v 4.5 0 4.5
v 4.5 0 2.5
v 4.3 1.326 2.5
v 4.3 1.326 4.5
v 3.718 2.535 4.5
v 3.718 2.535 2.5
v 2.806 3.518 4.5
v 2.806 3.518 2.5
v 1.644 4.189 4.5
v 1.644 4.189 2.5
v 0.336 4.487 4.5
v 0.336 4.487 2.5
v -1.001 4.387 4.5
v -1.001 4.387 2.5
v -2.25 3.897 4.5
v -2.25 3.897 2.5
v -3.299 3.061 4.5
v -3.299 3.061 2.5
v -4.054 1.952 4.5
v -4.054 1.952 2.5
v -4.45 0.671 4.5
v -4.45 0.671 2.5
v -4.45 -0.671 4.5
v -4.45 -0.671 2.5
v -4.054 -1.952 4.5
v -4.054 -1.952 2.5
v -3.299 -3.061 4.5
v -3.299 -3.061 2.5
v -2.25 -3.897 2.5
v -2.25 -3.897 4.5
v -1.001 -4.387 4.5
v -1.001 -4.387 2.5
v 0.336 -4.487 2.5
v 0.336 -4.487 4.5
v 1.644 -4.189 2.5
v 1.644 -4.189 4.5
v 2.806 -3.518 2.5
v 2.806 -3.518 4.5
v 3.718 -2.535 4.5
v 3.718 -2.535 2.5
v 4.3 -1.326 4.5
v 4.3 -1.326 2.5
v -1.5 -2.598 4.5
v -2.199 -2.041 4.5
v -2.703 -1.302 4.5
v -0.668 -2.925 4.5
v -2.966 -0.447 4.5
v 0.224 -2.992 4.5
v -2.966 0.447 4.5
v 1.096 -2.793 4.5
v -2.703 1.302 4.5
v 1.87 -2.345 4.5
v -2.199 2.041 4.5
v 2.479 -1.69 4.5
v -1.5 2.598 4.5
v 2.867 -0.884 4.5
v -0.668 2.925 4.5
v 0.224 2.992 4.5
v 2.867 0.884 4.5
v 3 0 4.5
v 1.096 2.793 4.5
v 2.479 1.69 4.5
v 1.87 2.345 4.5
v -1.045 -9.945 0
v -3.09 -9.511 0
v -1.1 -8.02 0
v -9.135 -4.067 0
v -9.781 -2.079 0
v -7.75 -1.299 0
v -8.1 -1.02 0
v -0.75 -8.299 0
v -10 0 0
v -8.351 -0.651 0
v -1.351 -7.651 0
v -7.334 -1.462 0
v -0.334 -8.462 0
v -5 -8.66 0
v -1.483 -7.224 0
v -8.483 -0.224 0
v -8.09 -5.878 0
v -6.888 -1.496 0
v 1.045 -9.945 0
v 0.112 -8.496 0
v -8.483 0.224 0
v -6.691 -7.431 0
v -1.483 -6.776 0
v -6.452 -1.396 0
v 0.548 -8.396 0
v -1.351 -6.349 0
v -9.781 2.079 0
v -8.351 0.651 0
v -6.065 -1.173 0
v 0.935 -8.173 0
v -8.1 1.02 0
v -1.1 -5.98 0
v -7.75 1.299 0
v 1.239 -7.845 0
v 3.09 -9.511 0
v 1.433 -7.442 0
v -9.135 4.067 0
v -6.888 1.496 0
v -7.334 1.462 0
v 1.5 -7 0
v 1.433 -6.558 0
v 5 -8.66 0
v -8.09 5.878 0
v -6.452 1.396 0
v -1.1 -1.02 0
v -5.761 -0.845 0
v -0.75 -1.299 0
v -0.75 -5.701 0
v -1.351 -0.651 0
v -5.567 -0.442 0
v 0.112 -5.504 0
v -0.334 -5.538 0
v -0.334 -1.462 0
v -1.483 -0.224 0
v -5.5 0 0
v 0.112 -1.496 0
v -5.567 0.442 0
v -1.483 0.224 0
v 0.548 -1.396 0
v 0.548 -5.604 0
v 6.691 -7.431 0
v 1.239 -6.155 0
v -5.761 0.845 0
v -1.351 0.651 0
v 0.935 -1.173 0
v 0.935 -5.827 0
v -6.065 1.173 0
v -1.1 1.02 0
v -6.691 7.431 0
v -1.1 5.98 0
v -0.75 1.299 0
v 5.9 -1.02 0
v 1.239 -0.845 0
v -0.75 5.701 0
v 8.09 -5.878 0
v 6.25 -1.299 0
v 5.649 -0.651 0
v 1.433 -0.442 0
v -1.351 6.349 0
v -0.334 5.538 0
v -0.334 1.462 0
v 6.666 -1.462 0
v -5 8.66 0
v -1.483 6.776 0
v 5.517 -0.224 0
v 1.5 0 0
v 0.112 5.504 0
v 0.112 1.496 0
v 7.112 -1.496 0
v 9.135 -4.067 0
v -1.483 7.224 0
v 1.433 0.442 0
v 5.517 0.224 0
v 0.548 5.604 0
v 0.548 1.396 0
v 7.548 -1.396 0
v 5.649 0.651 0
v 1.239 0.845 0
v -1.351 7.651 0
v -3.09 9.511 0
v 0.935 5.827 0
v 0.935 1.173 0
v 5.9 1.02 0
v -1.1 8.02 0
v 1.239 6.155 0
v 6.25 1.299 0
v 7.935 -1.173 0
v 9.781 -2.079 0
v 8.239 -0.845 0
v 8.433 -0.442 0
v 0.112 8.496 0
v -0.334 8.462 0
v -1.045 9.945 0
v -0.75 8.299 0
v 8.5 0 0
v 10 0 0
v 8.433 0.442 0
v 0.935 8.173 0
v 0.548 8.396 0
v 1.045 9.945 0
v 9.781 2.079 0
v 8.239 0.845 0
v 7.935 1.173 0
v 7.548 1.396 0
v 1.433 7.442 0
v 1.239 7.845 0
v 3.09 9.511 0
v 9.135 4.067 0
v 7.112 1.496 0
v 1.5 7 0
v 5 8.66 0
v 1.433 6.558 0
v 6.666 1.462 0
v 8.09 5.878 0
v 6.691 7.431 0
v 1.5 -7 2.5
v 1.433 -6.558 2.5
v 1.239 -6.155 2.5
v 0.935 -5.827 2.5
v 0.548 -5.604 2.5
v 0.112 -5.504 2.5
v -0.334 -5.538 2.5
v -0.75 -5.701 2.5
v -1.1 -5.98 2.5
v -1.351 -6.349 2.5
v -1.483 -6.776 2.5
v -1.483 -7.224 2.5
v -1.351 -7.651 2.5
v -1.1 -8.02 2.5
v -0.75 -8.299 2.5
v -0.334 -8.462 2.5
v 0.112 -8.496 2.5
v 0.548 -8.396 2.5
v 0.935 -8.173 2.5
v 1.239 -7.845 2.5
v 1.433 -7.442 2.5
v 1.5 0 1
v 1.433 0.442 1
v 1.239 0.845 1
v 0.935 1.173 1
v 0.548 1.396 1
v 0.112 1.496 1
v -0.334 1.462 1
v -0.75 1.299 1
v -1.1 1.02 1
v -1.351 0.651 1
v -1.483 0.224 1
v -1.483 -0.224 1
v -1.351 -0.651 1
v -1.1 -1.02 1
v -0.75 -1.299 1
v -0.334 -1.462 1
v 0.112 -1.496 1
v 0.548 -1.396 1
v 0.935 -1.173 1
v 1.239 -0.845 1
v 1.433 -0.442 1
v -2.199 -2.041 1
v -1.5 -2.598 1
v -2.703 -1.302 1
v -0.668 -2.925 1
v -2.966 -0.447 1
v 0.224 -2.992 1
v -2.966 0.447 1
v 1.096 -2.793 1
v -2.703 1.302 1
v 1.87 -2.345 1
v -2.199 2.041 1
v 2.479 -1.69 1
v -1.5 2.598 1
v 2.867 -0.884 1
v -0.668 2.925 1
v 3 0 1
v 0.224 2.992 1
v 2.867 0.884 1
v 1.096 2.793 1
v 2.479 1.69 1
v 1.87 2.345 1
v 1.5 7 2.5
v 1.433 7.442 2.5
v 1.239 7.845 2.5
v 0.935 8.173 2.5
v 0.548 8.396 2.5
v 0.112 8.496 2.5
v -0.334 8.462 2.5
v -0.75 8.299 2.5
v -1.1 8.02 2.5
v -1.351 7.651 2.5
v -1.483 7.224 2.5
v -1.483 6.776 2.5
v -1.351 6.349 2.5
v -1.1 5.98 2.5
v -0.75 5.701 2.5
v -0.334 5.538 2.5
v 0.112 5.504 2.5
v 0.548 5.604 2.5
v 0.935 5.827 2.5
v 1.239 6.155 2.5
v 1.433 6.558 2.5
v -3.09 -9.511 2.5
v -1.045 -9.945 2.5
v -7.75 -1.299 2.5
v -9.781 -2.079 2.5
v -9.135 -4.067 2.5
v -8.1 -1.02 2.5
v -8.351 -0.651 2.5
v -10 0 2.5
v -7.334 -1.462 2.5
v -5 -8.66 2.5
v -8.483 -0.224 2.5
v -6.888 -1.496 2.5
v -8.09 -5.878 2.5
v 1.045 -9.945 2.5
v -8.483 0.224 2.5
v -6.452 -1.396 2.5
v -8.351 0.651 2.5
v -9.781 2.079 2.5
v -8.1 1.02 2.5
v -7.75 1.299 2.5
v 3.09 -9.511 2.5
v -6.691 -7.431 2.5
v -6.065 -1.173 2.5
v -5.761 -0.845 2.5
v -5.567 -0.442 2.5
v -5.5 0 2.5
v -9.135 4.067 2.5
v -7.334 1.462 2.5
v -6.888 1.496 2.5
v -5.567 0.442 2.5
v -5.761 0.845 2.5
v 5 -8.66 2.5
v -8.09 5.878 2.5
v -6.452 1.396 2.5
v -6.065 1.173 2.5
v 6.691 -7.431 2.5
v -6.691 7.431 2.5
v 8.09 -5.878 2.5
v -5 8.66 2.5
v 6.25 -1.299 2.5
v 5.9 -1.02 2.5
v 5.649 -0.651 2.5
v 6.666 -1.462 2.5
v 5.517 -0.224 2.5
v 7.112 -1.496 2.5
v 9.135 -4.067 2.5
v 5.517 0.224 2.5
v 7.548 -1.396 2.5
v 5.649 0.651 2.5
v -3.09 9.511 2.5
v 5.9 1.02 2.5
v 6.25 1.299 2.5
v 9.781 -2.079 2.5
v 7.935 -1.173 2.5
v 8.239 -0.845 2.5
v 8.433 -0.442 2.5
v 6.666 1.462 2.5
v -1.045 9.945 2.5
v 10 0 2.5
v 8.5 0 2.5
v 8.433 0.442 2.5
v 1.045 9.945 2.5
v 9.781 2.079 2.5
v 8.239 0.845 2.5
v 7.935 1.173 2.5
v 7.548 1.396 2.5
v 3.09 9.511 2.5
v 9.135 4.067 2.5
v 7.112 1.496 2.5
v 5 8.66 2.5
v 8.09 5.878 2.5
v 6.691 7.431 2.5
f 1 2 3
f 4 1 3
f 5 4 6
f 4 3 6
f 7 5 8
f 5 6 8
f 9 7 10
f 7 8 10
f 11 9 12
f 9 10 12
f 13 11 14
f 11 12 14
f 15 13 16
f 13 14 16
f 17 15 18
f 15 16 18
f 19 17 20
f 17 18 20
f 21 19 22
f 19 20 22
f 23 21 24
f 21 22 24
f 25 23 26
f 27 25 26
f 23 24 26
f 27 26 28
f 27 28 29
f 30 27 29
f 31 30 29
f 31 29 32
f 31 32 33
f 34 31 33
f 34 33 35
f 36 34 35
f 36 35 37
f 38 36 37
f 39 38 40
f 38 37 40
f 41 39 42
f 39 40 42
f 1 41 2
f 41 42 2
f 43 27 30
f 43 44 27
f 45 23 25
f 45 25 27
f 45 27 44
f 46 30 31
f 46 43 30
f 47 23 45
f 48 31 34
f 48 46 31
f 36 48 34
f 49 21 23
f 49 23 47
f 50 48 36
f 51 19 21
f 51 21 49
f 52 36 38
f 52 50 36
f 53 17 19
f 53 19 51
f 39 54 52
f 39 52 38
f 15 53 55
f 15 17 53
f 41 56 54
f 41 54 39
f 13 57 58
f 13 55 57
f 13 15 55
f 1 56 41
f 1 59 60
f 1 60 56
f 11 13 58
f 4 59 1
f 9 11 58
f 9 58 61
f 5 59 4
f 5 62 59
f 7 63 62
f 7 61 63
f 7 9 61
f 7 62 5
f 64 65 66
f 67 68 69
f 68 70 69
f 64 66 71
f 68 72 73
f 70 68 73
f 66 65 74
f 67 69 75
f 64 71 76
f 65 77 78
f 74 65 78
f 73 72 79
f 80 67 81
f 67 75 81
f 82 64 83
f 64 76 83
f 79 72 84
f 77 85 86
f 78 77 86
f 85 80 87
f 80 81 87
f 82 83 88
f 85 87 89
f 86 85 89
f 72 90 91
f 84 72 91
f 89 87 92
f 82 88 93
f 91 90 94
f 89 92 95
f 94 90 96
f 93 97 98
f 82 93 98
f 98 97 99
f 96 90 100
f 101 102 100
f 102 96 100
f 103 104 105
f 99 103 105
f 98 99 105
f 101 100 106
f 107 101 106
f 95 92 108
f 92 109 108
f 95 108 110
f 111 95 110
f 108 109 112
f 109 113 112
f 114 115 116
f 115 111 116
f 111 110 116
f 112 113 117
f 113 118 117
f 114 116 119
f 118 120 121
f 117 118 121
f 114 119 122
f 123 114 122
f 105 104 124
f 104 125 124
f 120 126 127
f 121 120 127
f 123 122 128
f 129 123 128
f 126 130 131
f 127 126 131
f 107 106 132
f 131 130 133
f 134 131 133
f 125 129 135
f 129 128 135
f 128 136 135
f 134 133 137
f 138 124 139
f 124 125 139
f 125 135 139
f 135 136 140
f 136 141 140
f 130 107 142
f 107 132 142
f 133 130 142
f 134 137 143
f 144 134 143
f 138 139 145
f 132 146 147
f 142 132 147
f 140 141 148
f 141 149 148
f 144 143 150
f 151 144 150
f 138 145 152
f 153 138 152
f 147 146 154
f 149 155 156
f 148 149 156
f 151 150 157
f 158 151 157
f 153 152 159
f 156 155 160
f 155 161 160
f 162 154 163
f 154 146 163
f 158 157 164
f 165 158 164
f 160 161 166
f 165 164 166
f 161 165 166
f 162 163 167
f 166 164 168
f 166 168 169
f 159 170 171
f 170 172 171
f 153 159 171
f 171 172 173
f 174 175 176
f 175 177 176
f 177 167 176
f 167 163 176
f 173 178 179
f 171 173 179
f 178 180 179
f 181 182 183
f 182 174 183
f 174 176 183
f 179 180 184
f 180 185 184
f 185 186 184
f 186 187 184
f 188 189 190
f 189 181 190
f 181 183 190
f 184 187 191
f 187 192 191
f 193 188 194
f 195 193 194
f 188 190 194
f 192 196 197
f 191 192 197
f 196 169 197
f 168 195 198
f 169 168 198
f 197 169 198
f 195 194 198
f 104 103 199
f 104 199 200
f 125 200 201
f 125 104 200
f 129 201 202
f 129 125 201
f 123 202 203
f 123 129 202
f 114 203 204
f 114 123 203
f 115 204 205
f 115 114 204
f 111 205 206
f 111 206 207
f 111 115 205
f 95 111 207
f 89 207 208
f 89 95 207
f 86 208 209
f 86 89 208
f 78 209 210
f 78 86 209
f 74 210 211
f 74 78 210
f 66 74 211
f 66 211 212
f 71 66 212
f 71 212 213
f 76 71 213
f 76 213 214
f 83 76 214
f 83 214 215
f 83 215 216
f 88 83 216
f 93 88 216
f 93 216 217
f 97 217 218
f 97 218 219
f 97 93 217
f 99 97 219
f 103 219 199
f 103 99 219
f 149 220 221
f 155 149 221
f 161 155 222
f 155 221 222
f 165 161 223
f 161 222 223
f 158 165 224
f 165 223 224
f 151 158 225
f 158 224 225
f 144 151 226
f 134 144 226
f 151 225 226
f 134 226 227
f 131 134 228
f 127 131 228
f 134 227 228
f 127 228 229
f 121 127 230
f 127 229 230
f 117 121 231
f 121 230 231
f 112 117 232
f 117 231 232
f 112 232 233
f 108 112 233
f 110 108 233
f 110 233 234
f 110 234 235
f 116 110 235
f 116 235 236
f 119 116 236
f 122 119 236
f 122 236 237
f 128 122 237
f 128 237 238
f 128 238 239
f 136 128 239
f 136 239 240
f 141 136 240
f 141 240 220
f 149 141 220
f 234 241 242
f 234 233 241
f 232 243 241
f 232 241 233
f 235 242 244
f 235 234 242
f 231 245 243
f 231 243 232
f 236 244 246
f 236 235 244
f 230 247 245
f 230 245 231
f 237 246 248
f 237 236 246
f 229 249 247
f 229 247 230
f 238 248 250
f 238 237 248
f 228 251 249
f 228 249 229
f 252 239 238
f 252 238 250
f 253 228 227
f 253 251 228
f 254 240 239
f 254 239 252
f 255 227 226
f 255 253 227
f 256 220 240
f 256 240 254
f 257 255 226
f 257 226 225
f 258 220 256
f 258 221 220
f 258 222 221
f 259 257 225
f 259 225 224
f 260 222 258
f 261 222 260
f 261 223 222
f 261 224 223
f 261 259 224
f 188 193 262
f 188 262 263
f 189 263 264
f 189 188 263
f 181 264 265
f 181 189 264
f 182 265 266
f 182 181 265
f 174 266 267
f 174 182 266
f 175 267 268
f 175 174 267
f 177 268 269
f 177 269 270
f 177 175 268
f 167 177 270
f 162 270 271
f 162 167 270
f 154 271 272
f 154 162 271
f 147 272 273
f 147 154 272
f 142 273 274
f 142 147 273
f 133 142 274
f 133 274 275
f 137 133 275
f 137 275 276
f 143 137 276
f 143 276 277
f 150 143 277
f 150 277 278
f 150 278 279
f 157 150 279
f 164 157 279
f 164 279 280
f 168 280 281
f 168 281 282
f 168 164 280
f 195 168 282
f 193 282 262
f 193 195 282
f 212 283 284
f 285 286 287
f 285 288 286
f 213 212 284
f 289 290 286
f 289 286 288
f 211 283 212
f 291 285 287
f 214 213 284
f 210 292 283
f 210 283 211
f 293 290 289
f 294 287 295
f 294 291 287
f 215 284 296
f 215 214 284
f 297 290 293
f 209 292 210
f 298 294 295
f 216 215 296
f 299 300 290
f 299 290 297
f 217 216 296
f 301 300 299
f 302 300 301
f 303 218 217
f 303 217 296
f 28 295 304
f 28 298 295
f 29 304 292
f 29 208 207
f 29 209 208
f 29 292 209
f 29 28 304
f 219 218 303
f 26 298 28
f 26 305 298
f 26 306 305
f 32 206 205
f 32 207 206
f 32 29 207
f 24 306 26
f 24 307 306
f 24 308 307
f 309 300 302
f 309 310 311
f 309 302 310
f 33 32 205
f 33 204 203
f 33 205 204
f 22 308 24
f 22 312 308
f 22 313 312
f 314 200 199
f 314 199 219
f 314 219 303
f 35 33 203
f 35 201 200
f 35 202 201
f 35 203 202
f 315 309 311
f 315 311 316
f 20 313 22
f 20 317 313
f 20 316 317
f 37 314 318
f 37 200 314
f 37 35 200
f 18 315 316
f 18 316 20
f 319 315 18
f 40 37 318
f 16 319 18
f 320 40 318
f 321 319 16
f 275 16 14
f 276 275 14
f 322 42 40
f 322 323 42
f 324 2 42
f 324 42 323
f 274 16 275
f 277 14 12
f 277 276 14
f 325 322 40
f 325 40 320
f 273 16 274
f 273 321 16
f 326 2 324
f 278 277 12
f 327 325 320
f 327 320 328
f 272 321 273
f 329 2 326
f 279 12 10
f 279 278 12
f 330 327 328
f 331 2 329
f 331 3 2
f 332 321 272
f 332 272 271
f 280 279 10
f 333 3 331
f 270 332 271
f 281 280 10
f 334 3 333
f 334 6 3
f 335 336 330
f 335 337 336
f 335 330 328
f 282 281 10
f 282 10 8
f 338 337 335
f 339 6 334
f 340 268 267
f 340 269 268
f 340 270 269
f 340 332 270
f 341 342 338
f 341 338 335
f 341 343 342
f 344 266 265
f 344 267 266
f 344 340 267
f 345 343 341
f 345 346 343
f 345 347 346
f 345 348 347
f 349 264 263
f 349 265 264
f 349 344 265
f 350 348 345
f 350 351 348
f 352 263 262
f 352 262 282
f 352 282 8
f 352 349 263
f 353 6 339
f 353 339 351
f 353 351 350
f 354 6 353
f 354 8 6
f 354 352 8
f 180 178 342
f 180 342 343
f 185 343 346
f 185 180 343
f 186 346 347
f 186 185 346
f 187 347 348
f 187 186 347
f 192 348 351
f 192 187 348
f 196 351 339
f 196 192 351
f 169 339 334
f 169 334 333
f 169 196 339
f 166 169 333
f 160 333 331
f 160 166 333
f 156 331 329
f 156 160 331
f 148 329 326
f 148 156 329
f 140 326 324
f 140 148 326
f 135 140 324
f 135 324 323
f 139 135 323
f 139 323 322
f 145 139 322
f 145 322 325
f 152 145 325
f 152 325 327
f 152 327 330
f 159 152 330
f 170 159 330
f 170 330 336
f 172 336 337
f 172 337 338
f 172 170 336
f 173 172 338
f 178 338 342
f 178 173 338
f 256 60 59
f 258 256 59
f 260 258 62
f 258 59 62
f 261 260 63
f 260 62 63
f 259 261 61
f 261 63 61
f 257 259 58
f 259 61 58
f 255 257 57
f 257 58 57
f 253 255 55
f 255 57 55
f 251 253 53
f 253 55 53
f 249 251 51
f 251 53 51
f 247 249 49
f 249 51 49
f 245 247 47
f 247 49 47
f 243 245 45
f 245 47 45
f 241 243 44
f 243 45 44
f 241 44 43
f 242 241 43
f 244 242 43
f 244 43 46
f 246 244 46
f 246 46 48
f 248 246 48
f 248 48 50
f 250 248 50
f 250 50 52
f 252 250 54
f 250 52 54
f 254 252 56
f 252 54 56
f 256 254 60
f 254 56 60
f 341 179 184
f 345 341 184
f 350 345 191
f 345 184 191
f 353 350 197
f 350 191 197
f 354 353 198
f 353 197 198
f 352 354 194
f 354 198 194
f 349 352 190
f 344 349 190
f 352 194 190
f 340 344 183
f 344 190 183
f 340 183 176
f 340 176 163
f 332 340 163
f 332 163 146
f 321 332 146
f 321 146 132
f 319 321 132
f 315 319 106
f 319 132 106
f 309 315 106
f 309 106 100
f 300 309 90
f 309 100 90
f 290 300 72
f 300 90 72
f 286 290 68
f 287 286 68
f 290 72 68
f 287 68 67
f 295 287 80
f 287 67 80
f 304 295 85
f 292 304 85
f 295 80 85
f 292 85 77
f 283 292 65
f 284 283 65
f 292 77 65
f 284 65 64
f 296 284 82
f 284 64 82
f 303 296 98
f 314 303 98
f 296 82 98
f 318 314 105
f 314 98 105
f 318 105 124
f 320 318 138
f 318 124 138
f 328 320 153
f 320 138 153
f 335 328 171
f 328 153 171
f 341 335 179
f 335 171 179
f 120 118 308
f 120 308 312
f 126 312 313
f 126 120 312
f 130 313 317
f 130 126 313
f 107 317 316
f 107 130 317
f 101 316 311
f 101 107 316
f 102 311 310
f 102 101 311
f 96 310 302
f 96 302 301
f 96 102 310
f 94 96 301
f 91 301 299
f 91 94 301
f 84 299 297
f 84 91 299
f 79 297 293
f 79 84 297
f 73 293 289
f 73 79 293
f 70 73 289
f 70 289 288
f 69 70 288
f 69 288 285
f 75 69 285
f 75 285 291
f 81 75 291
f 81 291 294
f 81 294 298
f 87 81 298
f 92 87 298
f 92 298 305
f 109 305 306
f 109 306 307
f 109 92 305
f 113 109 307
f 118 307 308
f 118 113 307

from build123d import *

# Parameters (mm, degrees)
SKETCH_1_R          = 10
SKETCH_1_R_2        = 1.5
EXTRUDE_1_DEPTH     = 2.5
SKETCH_2_R          = 4.5
EXTRUDE_2_DEPTH     = 2
SKETCH_3_R          = 3
CUT_EXTRUDE_1_DEPTH = 3.5
SKETCH_4_R          = 1.5
CUT_EXTRUDE_2_DEPTH = 3.5


with BuildPart() as part:
    # 草图1 → 凸台-拉伸1 (new body)
    with BuildSketch(Plane.XY):
        Circle(SKETCH_1_R)
        with Locations((0, 7)):
            Circle(SKETCH_1_R_2, mode=Mode.SUBTRACT)
        with Locations((0, -7)):
            Circle(SKETCH_1_R_2, mode=Mode.SUBTRACT)
        with Locations((-7, 0)):
            Circle(SKETCH_1_R_2, mode=Mode.SUBTRACT)
        with Locations((7, 0)):
            Circle(SKETCH_1_R_2, mode=Mode.SUBTRACT)
    extrude(amount=EXTRUDE_1_DEPTH)

    # 草图2 → 凸台-拉伸2 (add)
    with BuildSketch(Plane.XY.offset(2.5)):
        Circle(SKETCH_2_R)
    extrude(amount=EXTRUDE_2_DEPTH)

    # 草图3 → 切除-拉伸1 (cut)
    with BuildSketch(Plane.XY.offset(4.5)):
        Circle(SKETCH_3_R)
    extrude(amount=-CUT_EXTRUDE_1_DEPTH, mode=Mode.SUBTRACT)

    # 草图4 → 切除-拉伸2 (cut)
    with BuildSketch(Plane.XY.offset(1)):
        Circle(SKETCH_4_R)
    extrude(amount=-CUT_EXTRUDE_2_DEPTH, mode=Mode.SUBTRACT)


solid = part.part
